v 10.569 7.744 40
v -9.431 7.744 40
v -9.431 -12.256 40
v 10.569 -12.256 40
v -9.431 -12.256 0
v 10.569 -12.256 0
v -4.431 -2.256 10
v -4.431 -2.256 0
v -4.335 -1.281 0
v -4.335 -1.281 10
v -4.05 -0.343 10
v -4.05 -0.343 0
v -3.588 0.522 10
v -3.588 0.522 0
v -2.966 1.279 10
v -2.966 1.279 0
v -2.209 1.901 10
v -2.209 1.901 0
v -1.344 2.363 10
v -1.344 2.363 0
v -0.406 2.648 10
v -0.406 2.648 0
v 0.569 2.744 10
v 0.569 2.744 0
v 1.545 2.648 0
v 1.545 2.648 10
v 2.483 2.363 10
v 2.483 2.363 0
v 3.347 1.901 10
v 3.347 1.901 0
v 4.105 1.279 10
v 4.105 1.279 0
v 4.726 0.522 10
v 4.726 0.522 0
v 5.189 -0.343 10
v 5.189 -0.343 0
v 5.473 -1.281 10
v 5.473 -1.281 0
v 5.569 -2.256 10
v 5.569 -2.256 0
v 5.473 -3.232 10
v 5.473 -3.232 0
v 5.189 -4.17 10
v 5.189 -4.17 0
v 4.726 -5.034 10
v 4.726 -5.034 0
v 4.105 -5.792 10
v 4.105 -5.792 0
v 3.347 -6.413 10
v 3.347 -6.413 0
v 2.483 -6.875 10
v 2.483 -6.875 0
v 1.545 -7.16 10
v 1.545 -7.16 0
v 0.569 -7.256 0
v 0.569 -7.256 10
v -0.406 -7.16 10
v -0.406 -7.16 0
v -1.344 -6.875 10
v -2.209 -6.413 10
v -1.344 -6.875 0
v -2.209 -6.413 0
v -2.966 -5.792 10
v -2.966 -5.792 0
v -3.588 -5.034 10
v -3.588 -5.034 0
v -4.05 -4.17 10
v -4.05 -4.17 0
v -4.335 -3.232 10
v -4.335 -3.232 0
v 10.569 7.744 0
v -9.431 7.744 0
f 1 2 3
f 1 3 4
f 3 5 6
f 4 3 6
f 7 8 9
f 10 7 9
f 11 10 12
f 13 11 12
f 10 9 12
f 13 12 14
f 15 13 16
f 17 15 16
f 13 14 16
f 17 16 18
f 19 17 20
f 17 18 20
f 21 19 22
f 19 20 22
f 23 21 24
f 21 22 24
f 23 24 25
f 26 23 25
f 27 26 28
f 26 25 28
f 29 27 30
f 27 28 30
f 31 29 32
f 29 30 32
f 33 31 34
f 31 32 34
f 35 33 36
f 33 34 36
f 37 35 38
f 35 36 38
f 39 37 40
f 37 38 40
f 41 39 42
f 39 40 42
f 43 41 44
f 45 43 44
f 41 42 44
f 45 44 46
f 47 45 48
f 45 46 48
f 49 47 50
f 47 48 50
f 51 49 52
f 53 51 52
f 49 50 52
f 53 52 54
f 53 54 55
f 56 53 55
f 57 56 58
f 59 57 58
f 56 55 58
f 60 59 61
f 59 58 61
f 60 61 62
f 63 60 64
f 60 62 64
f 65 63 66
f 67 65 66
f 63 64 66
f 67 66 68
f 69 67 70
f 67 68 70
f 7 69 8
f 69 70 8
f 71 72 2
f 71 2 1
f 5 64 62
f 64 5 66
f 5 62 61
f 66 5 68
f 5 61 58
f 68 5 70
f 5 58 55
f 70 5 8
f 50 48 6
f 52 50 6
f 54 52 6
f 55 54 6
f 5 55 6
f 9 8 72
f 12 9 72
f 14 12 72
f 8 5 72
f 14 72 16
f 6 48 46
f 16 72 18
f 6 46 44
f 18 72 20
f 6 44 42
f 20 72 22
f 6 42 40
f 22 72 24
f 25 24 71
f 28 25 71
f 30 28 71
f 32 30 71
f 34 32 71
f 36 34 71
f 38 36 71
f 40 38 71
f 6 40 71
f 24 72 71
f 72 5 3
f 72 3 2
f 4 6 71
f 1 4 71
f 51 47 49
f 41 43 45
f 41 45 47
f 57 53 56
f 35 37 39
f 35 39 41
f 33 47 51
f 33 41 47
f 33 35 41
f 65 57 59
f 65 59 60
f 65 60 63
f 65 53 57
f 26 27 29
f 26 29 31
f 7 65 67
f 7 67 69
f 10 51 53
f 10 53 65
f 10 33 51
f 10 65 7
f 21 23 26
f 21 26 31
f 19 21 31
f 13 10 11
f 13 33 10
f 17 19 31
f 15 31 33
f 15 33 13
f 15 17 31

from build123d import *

# Parameters (mm, degrees)
SKETCH1_W           = 20
SKETCH1_H           = 20
BOSS_EXTRUDE1_DEPTH = 40
SKETCH2_R           = 5
CUT_EXTRUDE1_DEPTH  = 10


with BuildPart() as part:
    # Sketch1 → Boss-Extrude1 (new body)
    with BuildSketch(Plane.XY):
        with Locations((0.569105691, -2.256097561)):
            Rectangle(SKETCH1_W, SKETCH1_H)
    extrude(amount=BOSS_EXTRUDE1_DEPTH)

    # Sketch2 → Cut-Extrude1 (cut, symmetric)
    with BuildSketch(Plane(origin=(0, 0, 0), x_dir=(-1, 0, 0), z_dir=(0, 0, -1))):
        with Locations((-0.569105691, -2.256097561)):
            Circle(SKETCH2_R)
    extrude(amount=CUT_EXTRUDE1_DEPTH, both=True, mode=Mode.SUBTRACT)


solid = part.part
